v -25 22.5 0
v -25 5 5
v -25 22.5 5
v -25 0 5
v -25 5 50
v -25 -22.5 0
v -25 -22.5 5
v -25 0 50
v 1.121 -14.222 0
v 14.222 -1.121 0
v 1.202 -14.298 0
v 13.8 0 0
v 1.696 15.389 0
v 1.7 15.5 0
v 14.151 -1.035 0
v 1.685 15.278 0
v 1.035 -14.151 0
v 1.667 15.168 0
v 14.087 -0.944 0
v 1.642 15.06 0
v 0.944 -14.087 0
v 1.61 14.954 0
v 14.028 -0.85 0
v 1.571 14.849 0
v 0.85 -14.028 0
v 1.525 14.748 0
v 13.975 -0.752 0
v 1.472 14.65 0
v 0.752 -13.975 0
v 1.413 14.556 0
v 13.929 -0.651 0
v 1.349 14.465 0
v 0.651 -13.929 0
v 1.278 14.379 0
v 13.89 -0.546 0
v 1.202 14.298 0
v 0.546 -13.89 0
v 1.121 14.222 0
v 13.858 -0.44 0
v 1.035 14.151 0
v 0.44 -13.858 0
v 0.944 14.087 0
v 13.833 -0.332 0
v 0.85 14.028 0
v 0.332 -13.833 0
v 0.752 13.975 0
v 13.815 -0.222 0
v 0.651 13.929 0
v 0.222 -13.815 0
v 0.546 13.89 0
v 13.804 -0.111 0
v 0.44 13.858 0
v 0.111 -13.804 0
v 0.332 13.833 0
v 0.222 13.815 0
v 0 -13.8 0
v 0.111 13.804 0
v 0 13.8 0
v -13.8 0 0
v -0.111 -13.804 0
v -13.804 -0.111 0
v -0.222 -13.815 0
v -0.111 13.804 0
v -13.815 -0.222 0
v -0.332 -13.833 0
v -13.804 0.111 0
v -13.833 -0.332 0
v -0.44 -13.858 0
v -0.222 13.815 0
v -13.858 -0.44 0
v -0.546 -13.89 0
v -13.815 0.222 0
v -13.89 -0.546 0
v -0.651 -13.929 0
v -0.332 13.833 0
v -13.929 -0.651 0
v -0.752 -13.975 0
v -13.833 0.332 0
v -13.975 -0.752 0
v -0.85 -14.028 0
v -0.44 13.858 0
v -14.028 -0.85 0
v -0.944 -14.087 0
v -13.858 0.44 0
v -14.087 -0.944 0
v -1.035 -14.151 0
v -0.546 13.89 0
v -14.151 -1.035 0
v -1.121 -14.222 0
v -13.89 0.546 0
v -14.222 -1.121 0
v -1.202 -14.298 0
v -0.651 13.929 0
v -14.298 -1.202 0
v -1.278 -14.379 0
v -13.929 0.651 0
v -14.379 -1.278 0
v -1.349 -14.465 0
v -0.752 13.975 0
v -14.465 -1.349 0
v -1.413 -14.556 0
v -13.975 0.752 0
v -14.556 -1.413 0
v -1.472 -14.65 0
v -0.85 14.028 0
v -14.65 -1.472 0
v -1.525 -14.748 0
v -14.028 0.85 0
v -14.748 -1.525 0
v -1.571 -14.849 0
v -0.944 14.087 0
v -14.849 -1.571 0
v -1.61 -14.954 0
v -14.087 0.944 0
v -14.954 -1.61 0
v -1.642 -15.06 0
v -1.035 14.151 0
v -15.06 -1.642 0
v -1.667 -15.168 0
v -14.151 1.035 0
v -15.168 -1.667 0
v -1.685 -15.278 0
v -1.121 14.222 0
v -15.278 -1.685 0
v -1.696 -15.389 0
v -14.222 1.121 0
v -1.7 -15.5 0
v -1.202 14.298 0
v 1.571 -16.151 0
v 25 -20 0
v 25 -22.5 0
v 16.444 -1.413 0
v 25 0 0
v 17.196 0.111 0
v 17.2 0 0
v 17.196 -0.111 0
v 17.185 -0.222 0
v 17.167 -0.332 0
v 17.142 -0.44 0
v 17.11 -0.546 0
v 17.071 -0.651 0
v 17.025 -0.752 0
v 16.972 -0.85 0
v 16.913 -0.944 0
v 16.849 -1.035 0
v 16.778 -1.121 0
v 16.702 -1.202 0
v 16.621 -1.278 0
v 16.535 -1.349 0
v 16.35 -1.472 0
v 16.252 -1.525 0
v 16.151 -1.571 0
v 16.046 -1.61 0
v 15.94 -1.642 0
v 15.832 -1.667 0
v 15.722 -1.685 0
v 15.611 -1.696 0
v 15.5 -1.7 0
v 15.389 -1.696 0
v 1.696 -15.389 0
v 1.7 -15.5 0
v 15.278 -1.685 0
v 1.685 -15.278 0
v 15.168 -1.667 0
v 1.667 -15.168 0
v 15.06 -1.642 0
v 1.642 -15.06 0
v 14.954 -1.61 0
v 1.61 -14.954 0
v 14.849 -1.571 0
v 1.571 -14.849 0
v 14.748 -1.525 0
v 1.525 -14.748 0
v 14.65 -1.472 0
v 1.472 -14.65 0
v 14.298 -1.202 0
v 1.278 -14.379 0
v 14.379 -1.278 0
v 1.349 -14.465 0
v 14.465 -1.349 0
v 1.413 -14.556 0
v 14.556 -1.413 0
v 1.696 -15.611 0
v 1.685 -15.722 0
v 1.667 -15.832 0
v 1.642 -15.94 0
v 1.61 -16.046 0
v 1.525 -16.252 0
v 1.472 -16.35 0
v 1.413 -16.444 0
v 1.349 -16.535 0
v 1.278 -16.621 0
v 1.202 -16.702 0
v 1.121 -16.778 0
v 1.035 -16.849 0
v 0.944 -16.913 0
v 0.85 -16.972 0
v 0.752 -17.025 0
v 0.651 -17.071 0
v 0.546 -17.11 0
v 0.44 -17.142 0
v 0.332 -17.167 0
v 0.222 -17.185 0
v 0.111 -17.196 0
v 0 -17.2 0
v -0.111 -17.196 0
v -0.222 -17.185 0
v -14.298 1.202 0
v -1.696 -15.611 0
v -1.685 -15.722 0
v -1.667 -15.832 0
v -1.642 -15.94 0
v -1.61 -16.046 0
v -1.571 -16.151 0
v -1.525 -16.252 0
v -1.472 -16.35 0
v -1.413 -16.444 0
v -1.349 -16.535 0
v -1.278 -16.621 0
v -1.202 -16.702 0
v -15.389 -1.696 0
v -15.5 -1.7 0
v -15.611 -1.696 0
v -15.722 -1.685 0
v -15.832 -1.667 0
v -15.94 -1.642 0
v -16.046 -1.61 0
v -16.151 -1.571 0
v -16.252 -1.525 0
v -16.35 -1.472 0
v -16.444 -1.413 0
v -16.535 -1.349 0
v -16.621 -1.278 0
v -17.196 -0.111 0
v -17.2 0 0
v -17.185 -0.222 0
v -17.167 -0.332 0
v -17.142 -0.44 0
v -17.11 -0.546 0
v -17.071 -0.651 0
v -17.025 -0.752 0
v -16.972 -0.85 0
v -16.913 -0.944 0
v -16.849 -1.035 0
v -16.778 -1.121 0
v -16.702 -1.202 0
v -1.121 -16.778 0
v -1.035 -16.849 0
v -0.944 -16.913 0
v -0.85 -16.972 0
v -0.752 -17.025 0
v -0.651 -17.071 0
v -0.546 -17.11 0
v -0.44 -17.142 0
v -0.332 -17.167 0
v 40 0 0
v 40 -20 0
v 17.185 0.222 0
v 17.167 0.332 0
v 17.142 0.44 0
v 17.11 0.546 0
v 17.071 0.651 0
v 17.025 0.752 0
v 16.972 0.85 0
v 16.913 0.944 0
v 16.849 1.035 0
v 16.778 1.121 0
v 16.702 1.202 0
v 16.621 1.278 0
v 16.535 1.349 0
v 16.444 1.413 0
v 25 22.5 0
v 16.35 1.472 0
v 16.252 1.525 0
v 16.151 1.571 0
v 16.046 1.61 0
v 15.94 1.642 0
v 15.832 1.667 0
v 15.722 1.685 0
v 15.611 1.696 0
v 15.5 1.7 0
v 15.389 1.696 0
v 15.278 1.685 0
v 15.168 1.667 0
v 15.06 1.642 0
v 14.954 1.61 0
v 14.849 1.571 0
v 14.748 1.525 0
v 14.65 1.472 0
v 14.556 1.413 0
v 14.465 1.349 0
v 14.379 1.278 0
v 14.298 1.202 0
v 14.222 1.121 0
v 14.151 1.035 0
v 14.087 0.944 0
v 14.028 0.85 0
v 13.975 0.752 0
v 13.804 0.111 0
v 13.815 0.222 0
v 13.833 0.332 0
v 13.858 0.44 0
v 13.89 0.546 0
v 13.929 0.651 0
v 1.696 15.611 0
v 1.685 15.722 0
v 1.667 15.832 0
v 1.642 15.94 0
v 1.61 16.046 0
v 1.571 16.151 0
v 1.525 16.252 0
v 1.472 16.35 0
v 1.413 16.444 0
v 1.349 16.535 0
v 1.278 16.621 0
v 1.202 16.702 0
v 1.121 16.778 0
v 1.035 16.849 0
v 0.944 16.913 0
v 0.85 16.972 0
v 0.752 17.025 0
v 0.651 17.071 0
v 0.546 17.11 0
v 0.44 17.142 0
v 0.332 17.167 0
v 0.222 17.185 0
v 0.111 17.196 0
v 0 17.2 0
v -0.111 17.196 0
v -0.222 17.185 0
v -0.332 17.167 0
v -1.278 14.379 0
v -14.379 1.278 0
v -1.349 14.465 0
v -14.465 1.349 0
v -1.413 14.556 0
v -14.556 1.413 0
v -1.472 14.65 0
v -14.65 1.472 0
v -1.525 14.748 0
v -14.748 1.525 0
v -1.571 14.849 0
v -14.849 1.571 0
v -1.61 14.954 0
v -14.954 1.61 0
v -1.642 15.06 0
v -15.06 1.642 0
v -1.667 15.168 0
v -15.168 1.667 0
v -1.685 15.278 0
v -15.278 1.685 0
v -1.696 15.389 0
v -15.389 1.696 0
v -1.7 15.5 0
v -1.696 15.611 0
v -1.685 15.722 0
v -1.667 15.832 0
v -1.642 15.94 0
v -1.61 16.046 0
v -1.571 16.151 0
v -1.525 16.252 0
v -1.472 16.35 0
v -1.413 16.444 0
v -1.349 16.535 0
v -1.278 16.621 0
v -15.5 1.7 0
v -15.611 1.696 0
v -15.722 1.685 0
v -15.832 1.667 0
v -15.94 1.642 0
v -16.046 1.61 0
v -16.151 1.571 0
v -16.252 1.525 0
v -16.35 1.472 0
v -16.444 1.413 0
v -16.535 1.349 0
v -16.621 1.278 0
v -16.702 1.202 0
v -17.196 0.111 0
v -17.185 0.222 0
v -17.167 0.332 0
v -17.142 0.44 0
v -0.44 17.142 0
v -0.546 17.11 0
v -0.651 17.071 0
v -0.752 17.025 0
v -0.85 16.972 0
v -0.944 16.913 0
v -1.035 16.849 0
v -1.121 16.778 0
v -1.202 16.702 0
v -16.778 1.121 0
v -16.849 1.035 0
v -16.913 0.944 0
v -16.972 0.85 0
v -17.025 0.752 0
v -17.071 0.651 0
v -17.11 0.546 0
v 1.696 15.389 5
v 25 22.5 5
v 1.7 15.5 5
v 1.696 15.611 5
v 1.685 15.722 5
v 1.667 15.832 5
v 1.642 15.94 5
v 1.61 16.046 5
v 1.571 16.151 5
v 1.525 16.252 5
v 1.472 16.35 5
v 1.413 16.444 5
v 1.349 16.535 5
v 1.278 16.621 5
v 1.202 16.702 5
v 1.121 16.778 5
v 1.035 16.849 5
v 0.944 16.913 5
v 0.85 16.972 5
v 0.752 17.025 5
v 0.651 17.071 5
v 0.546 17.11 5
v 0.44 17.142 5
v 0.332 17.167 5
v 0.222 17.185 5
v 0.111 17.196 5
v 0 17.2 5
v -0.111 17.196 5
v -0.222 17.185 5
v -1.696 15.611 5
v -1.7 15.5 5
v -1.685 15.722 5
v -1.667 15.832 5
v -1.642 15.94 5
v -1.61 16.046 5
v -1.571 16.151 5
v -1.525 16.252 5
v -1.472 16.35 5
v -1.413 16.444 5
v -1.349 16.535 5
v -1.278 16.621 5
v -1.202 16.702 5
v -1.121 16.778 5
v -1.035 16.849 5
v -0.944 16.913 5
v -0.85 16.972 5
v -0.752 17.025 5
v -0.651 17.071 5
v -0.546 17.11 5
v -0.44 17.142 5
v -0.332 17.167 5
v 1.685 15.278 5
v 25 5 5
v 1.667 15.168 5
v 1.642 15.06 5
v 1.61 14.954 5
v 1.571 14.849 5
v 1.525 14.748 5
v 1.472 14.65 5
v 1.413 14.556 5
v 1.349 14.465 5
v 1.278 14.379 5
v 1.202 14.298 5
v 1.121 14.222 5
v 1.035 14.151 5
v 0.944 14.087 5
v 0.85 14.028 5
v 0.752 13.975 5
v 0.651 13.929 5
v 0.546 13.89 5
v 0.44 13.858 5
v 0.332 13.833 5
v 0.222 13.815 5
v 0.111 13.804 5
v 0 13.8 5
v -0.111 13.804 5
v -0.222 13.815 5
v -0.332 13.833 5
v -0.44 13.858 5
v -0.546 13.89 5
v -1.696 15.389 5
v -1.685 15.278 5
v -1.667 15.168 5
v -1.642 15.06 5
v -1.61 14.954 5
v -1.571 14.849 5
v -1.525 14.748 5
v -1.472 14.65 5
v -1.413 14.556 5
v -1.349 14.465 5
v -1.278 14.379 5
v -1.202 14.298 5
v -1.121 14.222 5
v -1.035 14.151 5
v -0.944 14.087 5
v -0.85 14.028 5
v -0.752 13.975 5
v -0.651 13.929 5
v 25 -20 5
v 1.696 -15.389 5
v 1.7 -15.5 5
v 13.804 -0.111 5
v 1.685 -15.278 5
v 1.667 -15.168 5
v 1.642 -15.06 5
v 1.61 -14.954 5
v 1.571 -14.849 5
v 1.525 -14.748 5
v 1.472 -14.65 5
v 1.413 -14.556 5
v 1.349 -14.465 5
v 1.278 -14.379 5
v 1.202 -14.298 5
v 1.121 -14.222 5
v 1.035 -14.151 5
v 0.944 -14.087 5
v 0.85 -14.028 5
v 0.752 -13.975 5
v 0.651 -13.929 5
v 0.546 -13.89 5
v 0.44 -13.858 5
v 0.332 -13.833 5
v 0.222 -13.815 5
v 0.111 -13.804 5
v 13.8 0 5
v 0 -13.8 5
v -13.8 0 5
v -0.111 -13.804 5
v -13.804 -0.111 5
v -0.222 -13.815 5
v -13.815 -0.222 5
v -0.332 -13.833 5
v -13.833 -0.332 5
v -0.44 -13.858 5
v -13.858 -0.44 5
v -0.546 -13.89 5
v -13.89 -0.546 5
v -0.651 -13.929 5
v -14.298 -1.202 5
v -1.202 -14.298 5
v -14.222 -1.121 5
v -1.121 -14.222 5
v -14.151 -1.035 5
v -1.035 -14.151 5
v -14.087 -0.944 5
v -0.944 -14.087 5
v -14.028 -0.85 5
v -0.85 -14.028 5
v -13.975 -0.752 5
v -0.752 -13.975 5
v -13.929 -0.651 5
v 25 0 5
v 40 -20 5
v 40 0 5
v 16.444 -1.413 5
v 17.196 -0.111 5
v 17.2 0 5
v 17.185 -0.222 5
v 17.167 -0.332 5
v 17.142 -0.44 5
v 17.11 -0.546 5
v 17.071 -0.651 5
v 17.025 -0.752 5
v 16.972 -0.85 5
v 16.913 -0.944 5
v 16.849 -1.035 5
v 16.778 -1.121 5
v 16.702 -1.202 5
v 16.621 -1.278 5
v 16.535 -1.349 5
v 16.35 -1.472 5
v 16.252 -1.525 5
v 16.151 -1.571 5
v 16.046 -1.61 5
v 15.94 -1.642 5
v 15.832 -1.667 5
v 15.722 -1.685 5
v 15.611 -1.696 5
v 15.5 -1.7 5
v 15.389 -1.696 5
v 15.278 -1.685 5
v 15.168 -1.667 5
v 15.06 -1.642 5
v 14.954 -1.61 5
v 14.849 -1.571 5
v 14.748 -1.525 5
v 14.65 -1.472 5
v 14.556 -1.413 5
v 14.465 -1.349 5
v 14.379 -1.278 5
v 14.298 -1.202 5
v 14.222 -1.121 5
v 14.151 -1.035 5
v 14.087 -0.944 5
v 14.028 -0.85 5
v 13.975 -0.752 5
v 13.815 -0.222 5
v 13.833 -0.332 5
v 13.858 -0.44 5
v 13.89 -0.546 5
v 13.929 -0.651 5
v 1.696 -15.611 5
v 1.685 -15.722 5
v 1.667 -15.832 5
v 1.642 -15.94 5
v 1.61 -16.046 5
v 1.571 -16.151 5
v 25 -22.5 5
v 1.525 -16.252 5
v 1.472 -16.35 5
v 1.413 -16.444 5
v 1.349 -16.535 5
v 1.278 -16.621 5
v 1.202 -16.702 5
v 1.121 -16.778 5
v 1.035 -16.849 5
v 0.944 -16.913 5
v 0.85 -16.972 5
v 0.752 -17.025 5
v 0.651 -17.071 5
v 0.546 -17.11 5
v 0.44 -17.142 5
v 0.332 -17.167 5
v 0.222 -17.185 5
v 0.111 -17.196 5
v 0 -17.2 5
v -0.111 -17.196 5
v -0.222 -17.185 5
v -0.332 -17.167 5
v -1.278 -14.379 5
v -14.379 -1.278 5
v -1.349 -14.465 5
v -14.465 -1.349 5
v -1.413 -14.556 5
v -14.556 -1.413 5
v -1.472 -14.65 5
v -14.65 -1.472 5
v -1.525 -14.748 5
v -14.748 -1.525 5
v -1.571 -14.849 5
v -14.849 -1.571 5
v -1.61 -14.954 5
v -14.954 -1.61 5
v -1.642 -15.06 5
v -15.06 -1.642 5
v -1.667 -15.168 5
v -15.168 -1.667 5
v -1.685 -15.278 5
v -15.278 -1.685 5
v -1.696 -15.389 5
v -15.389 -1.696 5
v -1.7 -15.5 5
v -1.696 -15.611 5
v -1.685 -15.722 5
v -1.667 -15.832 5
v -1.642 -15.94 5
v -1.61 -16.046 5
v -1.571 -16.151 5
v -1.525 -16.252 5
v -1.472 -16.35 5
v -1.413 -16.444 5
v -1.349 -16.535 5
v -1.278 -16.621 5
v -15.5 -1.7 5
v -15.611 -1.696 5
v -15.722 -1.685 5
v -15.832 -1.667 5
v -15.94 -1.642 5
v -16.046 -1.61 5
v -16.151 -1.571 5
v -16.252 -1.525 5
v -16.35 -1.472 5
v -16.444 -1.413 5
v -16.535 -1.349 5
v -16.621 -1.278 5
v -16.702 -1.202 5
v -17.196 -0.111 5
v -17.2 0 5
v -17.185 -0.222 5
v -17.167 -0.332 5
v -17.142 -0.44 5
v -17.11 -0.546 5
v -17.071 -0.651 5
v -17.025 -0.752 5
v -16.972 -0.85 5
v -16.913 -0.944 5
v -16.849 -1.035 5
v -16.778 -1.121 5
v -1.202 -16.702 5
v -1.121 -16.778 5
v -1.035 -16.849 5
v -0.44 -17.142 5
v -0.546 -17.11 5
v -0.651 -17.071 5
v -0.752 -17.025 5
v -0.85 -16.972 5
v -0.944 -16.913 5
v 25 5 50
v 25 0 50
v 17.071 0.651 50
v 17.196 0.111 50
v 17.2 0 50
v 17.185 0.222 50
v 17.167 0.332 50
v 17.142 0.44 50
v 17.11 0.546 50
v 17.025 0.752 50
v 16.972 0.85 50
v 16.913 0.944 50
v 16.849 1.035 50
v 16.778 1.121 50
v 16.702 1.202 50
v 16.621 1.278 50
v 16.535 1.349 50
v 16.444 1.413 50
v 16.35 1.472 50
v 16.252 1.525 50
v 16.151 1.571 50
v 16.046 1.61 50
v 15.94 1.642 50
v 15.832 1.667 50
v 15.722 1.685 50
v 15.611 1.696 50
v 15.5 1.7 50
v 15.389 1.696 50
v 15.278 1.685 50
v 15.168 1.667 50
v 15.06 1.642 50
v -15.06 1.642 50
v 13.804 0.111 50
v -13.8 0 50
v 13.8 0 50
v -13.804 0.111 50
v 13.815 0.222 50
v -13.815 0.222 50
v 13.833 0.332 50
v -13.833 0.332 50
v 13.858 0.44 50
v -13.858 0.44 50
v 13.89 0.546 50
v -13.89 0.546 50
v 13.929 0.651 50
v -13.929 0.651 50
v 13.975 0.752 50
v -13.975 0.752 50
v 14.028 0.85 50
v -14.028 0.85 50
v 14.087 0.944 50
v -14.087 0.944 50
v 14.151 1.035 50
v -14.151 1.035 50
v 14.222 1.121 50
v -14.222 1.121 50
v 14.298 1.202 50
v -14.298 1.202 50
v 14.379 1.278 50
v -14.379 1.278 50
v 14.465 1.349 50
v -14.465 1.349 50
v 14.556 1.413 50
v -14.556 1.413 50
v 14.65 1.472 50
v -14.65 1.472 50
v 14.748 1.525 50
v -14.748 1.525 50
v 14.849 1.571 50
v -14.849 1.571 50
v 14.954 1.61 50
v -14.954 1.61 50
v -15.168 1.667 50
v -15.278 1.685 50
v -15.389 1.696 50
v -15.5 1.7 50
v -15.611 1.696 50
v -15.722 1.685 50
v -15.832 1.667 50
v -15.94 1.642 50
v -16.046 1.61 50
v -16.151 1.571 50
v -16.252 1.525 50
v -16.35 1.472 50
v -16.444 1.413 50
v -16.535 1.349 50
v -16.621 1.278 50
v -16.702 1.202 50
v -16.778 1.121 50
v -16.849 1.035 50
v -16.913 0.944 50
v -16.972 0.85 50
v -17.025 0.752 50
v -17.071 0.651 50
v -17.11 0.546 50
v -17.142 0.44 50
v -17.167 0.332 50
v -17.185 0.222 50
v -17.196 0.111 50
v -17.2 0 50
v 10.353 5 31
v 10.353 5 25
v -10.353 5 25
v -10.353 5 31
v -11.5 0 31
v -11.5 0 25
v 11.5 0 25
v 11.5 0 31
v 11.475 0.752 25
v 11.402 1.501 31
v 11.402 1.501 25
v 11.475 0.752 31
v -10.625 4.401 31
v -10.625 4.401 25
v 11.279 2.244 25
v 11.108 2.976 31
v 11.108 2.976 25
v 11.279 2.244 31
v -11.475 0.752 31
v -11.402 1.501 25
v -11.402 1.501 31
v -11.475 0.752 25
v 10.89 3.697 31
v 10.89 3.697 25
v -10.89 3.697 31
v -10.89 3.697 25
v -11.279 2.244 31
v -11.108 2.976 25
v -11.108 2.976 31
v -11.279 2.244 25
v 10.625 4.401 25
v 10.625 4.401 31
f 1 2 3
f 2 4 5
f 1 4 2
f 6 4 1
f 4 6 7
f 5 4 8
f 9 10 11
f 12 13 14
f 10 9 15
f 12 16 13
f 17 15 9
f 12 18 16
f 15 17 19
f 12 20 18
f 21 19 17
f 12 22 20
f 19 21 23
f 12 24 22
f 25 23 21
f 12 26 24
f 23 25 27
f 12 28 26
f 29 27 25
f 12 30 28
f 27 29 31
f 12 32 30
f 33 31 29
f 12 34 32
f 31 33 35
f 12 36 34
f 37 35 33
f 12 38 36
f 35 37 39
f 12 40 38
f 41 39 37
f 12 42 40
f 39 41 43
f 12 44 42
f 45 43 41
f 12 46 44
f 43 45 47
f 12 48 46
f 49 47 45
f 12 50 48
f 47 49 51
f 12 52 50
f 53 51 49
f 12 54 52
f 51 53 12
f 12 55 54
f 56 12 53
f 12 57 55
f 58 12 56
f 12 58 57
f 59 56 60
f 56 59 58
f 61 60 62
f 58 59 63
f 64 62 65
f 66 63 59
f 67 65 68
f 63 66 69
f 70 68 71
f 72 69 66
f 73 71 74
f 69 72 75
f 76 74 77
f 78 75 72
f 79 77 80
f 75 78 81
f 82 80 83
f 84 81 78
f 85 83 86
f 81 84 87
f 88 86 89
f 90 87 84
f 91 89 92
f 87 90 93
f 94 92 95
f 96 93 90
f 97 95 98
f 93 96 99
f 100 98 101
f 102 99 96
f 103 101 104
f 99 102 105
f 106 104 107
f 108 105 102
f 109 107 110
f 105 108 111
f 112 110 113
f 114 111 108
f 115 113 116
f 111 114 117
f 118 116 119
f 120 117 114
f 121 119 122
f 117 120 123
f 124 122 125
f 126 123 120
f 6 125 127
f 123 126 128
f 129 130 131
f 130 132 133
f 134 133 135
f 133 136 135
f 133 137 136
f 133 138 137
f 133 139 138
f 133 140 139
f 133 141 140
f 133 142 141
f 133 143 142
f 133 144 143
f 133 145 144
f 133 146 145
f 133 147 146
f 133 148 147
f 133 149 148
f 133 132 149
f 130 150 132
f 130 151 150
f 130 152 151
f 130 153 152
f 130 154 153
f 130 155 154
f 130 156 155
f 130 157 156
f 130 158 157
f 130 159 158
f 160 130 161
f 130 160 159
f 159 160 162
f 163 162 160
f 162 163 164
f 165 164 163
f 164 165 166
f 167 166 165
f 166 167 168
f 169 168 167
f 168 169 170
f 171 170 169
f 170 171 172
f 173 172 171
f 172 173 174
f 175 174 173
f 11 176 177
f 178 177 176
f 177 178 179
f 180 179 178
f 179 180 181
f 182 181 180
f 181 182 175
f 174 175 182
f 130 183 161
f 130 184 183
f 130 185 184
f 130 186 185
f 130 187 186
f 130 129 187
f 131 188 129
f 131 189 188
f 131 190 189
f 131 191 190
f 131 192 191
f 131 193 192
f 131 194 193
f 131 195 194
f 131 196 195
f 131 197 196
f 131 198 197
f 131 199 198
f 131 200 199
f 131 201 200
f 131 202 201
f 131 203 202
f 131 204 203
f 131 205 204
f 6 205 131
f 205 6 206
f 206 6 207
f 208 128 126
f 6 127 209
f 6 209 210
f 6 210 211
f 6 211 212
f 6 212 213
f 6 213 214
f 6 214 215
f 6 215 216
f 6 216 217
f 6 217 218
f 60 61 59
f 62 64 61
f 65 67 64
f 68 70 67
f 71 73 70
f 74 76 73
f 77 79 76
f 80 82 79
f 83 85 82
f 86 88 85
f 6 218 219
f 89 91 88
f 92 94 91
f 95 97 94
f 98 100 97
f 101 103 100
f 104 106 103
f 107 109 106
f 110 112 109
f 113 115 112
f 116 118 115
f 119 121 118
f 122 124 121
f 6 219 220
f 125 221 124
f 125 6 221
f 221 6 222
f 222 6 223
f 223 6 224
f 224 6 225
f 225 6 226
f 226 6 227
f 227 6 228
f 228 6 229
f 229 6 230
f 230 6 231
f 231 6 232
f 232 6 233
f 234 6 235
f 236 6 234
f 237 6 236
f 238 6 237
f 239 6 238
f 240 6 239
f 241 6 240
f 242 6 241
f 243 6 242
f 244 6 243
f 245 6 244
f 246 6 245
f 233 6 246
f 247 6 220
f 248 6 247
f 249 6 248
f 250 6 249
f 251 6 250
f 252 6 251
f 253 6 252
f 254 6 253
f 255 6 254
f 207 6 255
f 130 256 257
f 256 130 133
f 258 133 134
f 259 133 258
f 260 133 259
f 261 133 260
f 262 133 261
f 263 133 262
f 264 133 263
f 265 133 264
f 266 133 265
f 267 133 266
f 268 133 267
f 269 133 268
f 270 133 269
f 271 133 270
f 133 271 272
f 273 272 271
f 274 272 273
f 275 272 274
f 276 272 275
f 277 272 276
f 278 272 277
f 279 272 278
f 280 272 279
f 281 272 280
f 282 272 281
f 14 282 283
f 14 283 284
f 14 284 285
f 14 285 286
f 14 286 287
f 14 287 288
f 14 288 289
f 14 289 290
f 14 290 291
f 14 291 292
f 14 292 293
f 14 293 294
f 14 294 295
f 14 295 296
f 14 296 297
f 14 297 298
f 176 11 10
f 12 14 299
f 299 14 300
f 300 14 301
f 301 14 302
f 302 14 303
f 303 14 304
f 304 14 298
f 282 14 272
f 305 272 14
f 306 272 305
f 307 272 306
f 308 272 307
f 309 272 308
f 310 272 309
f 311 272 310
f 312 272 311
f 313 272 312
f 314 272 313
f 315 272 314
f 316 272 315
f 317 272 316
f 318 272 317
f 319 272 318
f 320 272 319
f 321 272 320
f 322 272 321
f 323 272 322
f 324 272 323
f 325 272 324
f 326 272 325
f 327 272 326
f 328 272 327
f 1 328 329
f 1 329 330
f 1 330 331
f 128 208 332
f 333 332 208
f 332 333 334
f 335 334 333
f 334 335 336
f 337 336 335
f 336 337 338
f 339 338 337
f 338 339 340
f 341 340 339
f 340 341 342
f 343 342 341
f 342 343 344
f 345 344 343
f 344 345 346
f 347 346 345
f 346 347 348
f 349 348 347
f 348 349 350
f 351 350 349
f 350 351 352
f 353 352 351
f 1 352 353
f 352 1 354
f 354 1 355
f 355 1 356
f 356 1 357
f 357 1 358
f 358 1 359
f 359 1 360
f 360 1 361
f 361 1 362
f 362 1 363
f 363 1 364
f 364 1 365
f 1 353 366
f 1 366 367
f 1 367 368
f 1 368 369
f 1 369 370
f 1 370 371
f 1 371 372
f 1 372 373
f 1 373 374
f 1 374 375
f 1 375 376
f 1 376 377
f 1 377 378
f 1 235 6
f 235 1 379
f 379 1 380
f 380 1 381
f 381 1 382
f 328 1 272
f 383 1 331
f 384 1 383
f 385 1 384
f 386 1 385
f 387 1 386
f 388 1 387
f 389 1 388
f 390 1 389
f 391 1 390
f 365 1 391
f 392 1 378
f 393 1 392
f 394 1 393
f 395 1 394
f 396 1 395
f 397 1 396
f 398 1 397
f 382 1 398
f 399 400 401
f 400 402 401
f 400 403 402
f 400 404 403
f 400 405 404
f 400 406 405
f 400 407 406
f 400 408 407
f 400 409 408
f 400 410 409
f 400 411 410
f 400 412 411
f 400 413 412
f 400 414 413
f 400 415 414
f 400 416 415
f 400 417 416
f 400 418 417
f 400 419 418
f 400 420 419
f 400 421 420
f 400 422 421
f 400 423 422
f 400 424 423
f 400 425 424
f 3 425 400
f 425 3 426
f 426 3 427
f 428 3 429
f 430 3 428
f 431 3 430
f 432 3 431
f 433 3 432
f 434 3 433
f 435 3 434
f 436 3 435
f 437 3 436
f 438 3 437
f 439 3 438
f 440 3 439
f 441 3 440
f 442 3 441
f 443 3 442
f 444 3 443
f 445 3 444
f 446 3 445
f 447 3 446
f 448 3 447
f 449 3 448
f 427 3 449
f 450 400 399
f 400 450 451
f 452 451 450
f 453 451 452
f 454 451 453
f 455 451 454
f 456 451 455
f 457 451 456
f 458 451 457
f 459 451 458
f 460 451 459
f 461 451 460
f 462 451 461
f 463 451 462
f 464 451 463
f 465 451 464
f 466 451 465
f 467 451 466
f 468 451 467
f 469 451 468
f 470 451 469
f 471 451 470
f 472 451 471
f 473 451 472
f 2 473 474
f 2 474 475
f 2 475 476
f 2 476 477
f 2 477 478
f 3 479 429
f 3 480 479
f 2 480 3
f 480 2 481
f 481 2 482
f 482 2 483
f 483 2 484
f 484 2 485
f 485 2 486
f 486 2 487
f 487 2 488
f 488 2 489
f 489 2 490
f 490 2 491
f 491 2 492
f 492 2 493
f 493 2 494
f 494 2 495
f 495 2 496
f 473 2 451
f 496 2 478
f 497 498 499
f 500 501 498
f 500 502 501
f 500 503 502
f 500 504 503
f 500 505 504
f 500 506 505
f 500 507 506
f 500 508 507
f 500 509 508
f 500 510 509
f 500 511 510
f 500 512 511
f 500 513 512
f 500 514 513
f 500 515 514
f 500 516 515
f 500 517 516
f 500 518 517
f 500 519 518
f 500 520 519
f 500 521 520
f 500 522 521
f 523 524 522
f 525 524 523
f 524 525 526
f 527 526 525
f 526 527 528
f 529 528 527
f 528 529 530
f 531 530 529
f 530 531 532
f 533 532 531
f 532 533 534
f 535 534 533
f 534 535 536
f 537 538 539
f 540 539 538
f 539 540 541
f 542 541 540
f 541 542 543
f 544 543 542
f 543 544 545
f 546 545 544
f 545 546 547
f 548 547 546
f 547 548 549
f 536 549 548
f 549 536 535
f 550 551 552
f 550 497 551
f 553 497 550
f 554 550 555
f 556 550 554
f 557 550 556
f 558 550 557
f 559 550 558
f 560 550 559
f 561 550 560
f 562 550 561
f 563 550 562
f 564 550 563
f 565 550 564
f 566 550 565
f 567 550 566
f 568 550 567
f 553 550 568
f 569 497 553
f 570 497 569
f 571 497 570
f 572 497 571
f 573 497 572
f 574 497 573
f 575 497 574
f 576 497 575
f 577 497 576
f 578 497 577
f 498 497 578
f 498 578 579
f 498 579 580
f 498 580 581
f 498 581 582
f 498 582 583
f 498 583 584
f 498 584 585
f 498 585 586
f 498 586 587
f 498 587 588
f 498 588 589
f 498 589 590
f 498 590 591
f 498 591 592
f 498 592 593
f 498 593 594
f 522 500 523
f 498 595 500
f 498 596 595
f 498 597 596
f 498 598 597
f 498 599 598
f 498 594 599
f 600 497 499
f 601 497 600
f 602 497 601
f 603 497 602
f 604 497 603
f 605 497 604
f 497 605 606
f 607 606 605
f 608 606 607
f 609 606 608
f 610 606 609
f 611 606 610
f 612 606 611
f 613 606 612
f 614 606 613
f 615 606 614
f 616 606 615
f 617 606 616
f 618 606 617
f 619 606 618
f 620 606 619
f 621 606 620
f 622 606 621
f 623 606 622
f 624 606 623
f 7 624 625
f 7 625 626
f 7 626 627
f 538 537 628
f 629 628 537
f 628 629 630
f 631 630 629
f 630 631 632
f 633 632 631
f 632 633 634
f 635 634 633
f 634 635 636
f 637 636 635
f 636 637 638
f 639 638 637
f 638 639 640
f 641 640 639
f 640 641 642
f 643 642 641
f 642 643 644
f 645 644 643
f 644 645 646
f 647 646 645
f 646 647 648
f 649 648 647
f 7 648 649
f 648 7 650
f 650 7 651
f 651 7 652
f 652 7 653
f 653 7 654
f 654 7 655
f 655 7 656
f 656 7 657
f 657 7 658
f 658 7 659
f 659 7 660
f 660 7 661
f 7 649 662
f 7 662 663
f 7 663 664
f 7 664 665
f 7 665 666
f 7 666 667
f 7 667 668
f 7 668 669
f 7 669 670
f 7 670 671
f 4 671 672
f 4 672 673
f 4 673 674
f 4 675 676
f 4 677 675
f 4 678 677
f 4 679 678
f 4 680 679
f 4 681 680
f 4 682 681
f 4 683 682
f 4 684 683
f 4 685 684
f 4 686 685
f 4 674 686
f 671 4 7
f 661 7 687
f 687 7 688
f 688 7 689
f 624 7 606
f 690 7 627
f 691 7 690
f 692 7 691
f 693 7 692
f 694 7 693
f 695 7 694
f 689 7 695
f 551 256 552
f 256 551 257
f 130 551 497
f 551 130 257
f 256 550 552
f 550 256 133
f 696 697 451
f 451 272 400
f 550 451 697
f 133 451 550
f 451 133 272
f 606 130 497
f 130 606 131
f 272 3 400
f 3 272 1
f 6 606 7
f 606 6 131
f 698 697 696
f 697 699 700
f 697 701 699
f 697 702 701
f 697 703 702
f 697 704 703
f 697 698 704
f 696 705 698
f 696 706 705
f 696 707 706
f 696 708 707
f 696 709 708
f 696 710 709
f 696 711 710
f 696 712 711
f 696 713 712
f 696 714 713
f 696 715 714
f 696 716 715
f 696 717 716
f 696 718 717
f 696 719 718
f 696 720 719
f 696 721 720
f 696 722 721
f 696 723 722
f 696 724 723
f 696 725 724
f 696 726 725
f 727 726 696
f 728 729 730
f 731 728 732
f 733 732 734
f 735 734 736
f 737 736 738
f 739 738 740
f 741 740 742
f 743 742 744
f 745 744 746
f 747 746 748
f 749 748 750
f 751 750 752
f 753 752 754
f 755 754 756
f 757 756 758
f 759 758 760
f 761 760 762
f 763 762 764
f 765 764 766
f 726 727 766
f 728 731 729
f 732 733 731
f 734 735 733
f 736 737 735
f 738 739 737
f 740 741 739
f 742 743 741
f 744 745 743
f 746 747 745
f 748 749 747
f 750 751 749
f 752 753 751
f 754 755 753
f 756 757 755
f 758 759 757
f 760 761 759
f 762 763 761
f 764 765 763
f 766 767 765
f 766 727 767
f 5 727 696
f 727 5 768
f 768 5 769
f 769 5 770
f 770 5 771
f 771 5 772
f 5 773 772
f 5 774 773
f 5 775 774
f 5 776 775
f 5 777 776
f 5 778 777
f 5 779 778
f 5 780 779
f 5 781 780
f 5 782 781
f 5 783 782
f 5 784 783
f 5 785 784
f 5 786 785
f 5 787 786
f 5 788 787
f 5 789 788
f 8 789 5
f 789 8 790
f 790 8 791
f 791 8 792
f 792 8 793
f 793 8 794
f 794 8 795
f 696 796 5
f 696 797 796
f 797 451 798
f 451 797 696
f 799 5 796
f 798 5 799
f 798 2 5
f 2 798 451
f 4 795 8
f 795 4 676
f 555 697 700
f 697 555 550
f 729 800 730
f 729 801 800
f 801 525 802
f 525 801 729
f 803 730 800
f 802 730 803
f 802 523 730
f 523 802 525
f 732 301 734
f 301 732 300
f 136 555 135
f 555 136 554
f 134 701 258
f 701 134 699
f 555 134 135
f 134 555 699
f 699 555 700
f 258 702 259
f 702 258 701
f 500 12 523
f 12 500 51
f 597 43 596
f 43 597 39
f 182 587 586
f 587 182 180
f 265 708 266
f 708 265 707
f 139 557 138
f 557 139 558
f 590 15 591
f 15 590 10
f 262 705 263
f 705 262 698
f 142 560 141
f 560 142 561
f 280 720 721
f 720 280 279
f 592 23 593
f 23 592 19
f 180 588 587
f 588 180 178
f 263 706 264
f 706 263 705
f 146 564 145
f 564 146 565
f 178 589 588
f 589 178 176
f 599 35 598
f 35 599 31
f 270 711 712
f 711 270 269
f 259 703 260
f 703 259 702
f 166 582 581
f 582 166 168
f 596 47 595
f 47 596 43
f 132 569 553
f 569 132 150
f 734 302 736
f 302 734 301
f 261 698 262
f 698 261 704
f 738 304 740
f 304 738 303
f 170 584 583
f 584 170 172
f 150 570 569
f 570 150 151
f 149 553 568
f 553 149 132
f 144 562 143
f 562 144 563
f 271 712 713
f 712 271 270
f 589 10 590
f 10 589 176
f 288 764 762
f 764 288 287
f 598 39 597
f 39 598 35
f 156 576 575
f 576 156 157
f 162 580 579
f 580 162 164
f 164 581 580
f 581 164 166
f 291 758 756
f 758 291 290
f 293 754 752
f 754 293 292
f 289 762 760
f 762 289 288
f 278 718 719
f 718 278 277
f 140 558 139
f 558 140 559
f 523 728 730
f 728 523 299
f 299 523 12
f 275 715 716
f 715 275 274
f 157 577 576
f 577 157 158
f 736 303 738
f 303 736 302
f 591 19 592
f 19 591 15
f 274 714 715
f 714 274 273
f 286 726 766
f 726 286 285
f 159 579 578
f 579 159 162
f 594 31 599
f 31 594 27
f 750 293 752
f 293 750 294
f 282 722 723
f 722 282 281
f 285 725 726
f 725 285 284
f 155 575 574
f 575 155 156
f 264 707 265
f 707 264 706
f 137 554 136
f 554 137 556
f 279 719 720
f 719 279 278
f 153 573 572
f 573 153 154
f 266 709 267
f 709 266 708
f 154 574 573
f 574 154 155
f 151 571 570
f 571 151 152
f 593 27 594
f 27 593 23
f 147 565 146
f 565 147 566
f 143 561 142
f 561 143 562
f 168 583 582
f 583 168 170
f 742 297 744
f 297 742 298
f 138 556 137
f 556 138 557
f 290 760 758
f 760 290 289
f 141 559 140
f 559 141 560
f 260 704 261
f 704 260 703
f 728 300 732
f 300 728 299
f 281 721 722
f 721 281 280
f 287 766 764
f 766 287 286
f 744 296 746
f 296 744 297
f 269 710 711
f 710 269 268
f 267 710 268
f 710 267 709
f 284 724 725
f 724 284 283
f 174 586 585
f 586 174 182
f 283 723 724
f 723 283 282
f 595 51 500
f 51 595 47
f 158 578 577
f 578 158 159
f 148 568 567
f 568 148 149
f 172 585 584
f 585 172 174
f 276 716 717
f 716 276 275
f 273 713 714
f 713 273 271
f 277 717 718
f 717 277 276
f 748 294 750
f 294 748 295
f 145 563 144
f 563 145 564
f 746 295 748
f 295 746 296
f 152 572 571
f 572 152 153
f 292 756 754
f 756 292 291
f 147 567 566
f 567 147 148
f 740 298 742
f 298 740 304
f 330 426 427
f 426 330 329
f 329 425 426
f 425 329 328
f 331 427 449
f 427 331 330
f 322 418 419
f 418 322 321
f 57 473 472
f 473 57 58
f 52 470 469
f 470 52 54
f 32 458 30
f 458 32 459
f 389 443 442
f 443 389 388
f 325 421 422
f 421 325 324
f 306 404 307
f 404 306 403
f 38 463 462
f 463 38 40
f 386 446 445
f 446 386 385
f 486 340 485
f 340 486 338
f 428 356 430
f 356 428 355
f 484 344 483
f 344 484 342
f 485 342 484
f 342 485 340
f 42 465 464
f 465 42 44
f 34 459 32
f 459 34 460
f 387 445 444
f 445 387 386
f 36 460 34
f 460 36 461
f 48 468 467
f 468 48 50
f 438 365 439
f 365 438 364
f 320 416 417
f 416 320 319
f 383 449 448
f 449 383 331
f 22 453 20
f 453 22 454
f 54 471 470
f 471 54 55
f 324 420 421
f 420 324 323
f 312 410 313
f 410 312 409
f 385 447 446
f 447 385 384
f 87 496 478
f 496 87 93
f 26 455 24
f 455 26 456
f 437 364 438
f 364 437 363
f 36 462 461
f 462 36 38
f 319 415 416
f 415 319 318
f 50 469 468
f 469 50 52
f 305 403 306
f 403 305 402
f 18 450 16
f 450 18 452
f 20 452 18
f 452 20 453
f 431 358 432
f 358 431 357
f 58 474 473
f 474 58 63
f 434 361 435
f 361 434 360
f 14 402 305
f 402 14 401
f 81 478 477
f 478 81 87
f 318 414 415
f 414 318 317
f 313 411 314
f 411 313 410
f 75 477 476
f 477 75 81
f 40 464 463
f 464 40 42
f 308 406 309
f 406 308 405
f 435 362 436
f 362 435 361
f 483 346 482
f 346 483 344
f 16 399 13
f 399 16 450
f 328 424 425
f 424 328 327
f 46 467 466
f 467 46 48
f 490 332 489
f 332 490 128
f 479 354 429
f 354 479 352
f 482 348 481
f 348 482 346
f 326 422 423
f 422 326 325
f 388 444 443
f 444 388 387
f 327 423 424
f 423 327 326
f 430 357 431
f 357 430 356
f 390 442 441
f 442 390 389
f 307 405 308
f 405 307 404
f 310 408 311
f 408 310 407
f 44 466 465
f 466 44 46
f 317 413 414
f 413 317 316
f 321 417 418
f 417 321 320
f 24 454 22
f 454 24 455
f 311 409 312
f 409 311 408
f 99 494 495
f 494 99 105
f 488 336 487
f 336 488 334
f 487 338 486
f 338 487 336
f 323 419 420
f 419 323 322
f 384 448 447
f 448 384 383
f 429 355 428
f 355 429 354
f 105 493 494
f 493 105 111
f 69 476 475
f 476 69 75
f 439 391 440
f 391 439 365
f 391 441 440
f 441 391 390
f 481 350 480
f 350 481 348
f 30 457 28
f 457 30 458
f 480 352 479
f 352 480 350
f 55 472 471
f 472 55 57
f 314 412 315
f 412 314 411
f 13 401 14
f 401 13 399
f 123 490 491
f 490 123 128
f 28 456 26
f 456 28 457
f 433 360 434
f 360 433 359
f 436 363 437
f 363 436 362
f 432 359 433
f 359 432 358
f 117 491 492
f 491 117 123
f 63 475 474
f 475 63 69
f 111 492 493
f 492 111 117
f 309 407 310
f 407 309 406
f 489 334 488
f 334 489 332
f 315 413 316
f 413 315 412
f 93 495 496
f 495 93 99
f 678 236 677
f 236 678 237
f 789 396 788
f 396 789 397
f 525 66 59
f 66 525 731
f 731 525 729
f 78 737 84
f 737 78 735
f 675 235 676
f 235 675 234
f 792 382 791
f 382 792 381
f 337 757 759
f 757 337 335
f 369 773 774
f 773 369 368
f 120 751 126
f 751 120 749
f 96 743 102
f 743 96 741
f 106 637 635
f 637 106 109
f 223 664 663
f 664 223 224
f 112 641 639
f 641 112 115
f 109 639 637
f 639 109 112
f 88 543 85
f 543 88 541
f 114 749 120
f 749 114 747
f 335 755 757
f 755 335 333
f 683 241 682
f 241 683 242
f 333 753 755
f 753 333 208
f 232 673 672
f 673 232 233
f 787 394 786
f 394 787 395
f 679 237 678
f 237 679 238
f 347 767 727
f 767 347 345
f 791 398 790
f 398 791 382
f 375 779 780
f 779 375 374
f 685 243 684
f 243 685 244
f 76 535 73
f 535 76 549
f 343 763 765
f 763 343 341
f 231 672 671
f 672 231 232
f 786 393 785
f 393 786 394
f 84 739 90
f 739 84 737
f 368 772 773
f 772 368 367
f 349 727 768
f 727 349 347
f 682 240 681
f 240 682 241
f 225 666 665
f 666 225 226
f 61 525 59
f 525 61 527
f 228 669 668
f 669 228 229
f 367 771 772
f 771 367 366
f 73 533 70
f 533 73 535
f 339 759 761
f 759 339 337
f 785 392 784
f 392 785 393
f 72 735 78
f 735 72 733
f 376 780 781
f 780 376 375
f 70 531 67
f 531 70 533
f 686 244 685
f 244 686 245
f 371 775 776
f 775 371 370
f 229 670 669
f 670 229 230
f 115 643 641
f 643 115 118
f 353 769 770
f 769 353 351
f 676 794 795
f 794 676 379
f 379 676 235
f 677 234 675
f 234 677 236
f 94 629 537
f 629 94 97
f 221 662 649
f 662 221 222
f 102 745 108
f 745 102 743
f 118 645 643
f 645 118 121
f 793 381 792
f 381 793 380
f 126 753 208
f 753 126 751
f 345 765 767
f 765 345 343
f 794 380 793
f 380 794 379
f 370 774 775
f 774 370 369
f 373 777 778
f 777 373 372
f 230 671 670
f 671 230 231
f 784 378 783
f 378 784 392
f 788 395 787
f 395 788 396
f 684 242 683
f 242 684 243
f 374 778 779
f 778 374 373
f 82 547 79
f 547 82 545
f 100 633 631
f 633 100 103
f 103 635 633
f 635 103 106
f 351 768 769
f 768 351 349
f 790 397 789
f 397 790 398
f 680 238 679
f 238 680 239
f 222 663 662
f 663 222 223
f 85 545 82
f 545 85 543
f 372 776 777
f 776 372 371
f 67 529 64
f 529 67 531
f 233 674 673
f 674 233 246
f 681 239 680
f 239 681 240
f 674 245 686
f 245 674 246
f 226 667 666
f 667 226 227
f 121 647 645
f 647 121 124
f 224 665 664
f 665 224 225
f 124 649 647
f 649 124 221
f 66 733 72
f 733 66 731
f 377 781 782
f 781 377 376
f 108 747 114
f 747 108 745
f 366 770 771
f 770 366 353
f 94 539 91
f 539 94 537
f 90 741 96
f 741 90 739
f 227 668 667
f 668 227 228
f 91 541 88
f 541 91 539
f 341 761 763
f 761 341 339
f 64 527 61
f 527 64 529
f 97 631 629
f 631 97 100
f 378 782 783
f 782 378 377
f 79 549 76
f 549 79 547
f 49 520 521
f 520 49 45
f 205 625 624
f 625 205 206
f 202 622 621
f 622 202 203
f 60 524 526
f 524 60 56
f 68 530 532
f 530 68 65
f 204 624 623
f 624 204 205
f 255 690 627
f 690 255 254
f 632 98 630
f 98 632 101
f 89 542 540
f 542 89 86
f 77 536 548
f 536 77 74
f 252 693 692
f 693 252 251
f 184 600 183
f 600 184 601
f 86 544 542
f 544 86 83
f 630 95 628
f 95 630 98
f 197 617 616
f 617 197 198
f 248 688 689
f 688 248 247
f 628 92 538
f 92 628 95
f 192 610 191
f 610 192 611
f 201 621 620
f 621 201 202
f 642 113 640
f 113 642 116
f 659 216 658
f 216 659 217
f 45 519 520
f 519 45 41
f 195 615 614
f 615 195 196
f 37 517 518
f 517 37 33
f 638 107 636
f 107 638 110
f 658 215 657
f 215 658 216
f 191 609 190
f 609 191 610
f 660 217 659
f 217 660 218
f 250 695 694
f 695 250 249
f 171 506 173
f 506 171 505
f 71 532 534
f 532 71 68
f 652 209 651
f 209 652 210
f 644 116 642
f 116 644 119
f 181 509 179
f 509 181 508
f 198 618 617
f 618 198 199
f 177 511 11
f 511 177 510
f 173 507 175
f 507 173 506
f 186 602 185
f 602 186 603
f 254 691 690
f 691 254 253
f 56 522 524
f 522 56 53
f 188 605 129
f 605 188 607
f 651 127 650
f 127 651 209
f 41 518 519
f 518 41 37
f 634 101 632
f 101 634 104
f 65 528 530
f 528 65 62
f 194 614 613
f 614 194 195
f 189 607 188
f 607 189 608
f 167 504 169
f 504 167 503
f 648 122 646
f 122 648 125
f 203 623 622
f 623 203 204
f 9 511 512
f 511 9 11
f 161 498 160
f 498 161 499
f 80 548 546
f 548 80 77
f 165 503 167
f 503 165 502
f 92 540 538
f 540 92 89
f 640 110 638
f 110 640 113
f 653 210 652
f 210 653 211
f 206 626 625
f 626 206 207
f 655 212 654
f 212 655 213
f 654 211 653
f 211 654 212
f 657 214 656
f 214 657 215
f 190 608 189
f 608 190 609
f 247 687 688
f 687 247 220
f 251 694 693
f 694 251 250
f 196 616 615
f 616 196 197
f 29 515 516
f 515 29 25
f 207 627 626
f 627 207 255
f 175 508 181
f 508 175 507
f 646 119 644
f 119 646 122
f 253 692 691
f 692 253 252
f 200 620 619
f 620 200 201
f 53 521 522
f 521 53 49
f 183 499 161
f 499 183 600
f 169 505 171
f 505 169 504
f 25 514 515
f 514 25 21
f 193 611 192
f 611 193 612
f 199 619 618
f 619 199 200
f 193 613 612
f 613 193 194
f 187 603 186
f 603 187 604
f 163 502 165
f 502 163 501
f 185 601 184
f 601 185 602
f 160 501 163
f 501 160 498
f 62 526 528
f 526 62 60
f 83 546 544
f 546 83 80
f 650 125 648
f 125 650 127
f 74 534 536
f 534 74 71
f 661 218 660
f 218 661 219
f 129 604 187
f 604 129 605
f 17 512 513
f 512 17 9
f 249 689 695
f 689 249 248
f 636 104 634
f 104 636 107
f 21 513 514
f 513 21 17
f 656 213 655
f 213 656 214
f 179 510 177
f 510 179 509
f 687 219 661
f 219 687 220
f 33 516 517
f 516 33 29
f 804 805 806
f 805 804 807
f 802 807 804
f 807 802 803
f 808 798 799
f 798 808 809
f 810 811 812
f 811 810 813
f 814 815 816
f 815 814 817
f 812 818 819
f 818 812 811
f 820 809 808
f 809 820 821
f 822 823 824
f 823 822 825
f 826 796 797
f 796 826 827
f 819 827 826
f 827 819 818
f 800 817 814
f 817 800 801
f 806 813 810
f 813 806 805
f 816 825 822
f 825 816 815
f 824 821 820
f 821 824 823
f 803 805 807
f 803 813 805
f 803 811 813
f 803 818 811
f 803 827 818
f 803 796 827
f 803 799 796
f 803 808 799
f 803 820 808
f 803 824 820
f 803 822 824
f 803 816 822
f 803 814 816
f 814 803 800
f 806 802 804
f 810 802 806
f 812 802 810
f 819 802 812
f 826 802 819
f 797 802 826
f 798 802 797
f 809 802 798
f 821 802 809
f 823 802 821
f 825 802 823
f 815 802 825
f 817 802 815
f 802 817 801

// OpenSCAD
// L-shaped mounting bracket for NEMA 17 stepper motor
// Print orientation: base plate flat on bed, motor plate standing up

$fn = 96;

// ---- Base plate ----
base_x = 50;      // X span (centered)
base_y = 45;      // Y span
base_t = 5;       // plate thickness

// ---- Motor plate ----
motor_x = 50;     // X span (centered)
motor_y = 5;      // Y span
motor_h = 50;     // height in Z

// ---- Boss hole ----
boss_d = 23;      // motor centring boss hole diameter
boss_z = 28;      // hole centre height

// ---- Screw holes ----
screw_d = 3.4;    // M3 screw hole diameter
screw_p = 31;     // square pattern side length

// ---- Gussets ----
gusset_t = 5;     // gusset thickness
gusset_l = 20;    // leg length along Y and Z
gusset_x = 5;     // horizontal offset from plate edges

// ---- Misc ----
eps = 0.5;        // overshoot for clean cuts

difference() {
    union() {
        // Base plate
        translate([-base_x/2, -base_y/2, 0])
            cube([base_x, base_y, base_t]);

        // Motor plate
        translate([-motor_x/2, 0, 0])
            cube([motor_x, motor_y, motor_h]);

        // Gussets
        for (sx = [-1, 1])
            translate([sx > 0 ? motor_x/2 - gusset_x : -motor_x/2, 0, 0])
                rotate([90, 0, 0])
                    cube([gusset_l, gusset_t, gusset_l]);
    }

    // Boss hole
    translate([0, 0, boss_z])
        cylinder(d = boss_d, h = motor_y + 2*eps, center = true);

    // Screw holes
    for (a = [0, 90, 180, 270])
        rotate([0, 0, a])
            translate([screw_p/2, 0, -eps])
                cylinder(d = screw_d, h = motor_h + 2*eps);
}
